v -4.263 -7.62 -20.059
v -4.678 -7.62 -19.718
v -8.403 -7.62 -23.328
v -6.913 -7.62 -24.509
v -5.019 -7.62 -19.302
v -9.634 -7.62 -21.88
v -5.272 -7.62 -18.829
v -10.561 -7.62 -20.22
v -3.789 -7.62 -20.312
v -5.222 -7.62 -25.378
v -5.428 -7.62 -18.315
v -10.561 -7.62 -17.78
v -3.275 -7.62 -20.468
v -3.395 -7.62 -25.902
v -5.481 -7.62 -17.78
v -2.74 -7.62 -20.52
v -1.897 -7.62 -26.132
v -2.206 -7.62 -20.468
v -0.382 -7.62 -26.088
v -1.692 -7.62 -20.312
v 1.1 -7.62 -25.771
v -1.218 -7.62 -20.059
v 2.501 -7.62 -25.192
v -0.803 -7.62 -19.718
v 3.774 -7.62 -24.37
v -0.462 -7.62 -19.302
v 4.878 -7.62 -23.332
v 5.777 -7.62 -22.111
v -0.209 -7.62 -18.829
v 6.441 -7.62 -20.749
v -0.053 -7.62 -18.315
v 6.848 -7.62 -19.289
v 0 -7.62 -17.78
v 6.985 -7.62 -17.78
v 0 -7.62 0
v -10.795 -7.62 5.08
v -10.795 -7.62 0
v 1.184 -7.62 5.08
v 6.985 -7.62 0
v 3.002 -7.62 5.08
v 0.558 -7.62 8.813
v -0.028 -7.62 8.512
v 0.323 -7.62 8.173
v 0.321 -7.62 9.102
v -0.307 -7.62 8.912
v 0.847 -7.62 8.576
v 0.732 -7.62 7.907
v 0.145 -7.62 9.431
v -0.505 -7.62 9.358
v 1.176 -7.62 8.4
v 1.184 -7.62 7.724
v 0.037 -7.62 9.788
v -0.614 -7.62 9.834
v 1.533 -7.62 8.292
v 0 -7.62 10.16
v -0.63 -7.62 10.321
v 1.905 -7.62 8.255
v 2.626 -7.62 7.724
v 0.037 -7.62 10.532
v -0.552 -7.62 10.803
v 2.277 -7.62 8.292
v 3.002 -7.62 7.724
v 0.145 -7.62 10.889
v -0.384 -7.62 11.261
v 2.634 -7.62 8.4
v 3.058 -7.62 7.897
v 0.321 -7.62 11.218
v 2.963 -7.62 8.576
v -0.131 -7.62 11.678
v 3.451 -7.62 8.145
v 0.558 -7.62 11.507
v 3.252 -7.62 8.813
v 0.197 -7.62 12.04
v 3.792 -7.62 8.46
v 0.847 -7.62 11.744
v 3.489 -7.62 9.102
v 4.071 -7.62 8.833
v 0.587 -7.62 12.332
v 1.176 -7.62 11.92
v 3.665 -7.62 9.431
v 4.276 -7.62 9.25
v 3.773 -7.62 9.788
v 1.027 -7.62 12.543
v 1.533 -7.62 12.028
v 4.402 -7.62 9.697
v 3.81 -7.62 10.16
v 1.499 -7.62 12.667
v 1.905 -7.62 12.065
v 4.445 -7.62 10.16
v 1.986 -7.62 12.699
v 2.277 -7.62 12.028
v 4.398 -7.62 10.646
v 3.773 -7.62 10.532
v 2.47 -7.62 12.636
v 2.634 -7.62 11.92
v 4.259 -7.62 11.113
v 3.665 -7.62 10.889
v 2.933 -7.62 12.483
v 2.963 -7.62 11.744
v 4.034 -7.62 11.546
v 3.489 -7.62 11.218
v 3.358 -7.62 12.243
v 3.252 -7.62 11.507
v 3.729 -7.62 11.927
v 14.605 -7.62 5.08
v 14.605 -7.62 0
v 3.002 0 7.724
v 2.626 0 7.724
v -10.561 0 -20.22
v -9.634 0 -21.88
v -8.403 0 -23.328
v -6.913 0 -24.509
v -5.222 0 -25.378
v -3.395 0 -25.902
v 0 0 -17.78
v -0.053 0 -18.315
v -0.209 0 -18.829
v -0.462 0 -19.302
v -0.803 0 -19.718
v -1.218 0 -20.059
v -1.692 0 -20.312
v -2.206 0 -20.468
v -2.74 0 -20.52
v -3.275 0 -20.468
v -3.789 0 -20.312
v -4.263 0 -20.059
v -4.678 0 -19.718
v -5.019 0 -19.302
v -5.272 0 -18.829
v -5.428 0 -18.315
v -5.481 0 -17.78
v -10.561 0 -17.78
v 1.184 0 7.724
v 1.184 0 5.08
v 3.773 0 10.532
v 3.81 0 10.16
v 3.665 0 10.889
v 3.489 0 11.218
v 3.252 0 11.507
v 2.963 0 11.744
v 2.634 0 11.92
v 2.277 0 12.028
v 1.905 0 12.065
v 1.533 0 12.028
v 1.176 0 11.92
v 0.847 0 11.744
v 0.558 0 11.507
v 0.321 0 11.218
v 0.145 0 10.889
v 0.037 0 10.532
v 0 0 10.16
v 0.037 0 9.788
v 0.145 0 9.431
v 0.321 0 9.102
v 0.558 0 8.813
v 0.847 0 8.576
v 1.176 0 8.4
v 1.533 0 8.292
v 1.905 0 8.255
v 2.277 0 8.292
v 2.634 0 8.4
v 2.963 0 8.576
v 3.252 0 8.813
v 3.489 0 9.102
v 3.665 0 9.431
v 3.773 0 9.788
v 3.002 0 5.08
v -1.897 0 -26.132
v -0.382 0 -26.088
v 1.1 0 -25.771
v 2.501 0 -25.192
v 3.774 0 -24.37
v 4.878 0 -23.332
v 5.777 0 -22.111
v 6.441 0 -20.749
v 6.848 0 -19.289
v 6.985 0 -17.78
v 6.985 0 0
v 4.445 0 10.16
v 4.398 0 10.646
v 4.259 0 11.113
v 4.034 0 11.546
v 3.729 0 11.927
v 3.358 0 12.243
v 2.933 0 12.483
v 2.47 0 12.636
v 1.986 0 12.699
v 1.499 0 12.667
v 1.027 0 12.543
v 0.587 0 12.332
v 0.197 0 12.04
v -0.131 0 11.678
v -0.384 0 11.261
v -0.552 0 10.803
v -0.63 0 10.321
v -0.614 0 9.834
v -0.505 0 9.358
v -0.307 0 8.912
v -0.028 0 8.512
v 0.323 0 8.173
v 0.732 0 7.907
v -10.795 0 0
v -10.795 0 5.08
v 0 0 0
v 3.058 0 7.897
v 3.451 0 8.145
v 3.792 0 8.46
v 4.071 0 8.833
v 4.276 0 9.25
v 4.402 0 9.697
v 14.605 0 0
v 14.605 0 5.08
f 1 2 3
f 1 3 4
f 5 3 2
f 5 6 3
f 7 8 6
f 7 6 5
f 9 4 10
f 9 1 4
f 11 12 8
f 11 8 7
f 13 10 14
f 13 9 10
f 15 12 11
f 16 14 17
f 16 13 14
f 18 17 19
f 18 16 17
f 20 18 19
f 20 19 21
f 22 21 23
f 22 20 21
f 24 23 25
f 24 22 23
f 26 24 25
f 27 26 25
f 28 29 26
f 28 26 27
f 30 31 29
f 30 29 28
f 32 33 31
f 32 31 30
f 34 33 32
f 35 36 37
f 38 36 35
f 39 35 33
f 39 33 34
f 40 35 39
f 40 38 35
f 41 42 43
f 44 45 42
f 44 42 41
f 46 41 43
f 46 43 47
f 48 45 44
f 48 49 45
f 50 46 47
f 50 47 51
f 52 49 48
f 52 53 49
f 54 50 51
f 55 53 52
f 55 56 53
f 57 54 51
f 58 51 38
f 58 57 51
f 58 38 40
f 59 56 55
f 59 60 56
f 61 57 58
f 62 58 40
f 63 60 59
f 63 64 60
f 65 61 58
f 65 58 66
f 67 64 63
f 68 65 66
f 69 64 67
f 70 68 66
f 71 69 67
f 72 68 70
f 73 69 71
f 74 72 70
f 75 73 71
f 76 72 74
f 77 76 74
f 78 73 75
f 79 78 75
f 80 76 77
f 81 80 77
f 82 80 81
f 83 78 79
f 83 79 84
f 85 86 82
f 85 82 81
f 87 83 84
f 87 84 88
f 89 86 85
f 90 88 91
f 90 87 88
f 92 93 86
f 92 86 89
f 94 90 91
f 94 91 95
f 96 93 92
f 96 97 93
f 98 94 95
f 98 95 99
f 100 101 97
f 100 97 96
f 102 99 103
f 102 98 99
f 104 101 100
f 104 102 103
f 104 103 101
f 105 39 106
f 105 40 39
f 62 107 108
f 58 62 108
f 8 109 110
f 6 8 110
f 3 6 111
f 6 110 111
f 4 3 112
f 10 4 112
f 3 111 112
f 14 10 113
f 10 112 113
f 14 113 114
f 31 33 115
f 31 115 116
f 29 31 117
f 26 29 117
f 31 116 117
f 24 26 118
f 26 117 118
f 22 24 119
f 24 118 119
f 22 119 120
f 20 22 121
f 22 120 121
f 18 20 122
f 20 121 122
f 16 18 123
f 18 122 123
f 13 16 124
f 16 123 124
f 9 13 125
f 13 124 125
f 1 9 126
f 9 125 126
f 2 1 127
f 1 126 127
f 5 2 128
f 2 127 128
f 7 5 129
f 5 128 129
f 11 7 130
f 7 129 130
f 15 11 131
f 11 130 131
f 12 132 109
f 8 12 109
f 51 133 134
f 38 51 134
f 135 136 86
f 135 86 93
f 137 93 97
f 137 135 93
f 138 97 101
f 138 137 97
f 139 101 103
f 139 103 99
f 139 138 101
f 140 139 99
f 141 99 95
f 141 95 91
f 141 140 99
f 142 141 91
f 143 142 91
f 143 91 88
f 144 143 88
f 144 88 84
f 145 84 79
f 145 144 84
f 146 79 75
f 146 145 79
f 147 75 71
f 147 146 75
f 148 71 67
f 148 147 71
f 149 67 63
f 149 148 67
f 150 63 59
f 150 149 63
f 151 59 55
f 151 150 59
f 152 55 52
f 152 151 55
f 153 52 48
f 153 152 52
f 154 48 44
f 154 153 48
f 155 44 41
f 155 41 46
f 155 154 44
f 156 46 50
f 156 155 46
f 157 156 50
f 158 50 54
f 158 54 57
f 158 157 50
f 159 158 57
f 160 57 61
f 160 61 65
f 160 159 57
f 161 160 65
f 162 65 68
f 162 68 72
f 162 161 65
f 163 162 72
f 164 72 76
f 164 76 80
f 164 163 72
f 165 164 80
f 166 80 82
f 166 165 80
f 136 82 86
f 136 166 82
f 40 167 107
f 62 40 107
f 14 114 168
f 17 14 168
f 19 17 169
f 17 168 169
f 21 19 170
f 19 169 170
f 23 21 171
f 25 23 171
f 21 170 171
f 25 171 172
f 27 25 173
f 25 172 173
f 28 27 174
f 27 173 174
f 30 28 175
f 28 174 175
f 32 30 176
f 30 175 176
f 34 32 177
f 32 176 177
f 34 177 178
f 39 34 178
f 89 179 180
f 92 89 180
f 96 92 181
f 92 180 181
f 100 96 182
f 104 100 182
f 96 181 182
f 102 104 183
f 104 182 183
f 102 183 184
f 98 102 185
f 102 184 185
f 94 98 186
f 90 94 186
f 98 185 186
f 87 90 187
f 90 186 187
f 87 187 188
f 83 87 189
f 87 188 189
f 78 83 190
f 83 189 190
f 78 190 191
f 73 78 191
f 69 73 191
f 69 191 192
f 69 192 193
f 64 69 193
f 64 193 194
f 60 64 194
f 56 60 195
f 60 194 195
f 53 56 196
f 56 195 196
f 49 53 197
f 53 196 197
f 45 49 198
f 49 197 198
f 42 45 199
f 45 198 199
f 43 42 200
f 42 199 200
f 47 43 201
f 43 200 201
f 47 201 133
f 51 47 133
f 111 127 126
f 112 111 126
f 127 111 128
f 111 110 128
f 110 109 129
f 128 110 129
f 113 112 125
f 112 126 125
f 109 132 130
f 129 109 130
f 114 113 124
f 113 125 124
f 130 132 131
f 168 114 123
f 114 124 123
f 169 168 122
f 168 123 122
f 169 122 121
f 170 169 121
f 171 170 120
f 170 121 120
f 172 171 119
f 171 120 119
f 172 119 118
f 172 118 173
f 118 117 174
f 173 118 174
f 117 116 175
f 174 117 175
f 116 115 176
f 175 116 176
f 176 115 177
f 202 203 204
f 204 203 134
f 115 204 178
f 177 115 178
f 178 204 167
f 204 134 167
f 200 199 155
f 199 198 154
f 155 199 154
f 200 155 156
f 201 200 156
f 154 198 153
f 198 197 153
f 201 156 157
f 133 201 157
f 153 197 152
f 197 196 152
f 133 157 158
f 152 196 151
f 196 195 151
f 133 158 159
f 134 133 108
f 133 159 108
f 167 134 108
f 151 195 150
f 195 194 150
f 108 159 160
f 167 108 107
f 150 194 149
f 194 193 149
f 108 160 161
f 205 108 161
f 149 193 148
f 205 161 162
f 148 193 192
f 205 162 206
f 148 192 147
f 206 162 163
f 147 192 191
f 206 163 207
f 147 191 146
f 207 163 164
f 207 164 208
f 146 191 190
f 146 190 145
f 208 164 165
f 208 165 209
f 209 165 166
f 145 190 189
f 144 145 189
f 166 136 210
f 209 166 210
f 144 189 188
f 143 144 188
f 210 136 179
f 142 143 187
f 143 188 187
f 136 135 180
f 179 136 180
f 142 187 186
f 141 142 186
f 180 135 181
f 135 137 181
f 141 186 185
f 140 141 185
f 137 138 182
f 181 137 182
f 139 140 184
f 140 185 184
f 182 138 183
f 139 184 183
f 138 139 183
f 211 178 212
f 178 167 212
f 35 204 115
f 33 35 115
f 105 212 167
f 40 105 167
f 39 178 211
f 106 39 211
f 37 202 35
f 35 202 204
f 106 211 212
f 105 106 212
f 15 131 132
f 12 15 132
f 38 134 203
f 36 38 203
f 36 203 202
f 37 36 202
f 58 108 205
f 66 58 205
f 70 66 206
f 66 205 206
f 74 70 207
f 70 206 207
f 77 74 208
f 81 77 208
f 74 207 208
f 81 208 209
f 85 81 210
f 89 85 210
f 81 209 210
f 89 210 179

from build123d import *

# Parameters (mm, degrees)
F0_R     = 1.905
F1_DEPTH = 7.62


with BuildPart() as f1:
    # F0 (on Front) → F1 (new body)
    with BuildSketch(Plane.XZ):
        with BuildLine():
            Line((1.1841486596, 5.08), (-10.795, 5.08))
            Line((-10.795, 5.08), (-10.795, 0))
            Line((-10.795, 0), (0, 0))
            Line((0, 0), (0, -17.78))
            ThreePointArc((0, -17.78), (-2.7403535787, -20.5203535787), (-5.4807071574, -17.78))
            Line((-5.4807071574, -17.78), (-10.5607071574, -17.78))
            Line((-10.5607071574, -17.78), (-10.5607071574, -20.2195488962))
            ThreePointArc((-10.5607071574, -20.2195488962), (-7.6870708125, -23.955222101), (-3.3948952839, -25.9020835155))
            ThreePointArc((-3.3948952839, -25.9020835155), (3.7738885263, -24.3699633295), (6.985, -17.78))
            Line((6.985, -17.78), (6.985, 0))
            Line((6.985, 0), (14.605, 0))
            Line((14.605, 0), (14.605, 5.08))
            Line((14.605, 5.08), (3.0016307719, 5.08))
            Line((3.0016307719, 5.08), (1.1841486596, 5.08))
        make_face()
        with BuildLine():
            Line((1.1841486596, 7.7244357235), (1.1841486596, 5.08))
            Line((1.1841486596, 5.08), (3.0016307719, 5.08))
            Line((3.0016307719, 5.08), (3.0016307719, 7.7244357235))
            Line((3.0016307719, 7.7244357235), (2.6258513404, 7.7244357235))
            ThreePointArc((2.6258513404, 7.7244357235), (1.905, 7.62), (1.1841486596, 7.7244357235))
        make_face()
        with BuildLine():
            Line((2.6258513404, 7.7244357235), (1.1841486596, 7.7244357235))
            ThreePointArc((1.1841486596, 7.7244357235), (1.905, 7.62), (2.6258513404, 7.7244357235))
        make_face()
        with BuildLine():
            ThreePointArc((4.445, 10.16), (0.3850267115, 12.1950138089), (1.1841486596, 7.7244357235))
            Line((1.1841486596, 7.7244357235), (2.6258513404, 7.7244357235))
            ThreePointArc((2.6258513404, 7.7244357235), (3.9400138089, 8.6400267115), (4.445, 10.16))
        make_face()
        with Locations((1.905, 10.16)):
            Circle(F0_R, mode=Mode.SUBTRACT)
    extrude(amount=F1_DEPTH)


solid = f1.part
